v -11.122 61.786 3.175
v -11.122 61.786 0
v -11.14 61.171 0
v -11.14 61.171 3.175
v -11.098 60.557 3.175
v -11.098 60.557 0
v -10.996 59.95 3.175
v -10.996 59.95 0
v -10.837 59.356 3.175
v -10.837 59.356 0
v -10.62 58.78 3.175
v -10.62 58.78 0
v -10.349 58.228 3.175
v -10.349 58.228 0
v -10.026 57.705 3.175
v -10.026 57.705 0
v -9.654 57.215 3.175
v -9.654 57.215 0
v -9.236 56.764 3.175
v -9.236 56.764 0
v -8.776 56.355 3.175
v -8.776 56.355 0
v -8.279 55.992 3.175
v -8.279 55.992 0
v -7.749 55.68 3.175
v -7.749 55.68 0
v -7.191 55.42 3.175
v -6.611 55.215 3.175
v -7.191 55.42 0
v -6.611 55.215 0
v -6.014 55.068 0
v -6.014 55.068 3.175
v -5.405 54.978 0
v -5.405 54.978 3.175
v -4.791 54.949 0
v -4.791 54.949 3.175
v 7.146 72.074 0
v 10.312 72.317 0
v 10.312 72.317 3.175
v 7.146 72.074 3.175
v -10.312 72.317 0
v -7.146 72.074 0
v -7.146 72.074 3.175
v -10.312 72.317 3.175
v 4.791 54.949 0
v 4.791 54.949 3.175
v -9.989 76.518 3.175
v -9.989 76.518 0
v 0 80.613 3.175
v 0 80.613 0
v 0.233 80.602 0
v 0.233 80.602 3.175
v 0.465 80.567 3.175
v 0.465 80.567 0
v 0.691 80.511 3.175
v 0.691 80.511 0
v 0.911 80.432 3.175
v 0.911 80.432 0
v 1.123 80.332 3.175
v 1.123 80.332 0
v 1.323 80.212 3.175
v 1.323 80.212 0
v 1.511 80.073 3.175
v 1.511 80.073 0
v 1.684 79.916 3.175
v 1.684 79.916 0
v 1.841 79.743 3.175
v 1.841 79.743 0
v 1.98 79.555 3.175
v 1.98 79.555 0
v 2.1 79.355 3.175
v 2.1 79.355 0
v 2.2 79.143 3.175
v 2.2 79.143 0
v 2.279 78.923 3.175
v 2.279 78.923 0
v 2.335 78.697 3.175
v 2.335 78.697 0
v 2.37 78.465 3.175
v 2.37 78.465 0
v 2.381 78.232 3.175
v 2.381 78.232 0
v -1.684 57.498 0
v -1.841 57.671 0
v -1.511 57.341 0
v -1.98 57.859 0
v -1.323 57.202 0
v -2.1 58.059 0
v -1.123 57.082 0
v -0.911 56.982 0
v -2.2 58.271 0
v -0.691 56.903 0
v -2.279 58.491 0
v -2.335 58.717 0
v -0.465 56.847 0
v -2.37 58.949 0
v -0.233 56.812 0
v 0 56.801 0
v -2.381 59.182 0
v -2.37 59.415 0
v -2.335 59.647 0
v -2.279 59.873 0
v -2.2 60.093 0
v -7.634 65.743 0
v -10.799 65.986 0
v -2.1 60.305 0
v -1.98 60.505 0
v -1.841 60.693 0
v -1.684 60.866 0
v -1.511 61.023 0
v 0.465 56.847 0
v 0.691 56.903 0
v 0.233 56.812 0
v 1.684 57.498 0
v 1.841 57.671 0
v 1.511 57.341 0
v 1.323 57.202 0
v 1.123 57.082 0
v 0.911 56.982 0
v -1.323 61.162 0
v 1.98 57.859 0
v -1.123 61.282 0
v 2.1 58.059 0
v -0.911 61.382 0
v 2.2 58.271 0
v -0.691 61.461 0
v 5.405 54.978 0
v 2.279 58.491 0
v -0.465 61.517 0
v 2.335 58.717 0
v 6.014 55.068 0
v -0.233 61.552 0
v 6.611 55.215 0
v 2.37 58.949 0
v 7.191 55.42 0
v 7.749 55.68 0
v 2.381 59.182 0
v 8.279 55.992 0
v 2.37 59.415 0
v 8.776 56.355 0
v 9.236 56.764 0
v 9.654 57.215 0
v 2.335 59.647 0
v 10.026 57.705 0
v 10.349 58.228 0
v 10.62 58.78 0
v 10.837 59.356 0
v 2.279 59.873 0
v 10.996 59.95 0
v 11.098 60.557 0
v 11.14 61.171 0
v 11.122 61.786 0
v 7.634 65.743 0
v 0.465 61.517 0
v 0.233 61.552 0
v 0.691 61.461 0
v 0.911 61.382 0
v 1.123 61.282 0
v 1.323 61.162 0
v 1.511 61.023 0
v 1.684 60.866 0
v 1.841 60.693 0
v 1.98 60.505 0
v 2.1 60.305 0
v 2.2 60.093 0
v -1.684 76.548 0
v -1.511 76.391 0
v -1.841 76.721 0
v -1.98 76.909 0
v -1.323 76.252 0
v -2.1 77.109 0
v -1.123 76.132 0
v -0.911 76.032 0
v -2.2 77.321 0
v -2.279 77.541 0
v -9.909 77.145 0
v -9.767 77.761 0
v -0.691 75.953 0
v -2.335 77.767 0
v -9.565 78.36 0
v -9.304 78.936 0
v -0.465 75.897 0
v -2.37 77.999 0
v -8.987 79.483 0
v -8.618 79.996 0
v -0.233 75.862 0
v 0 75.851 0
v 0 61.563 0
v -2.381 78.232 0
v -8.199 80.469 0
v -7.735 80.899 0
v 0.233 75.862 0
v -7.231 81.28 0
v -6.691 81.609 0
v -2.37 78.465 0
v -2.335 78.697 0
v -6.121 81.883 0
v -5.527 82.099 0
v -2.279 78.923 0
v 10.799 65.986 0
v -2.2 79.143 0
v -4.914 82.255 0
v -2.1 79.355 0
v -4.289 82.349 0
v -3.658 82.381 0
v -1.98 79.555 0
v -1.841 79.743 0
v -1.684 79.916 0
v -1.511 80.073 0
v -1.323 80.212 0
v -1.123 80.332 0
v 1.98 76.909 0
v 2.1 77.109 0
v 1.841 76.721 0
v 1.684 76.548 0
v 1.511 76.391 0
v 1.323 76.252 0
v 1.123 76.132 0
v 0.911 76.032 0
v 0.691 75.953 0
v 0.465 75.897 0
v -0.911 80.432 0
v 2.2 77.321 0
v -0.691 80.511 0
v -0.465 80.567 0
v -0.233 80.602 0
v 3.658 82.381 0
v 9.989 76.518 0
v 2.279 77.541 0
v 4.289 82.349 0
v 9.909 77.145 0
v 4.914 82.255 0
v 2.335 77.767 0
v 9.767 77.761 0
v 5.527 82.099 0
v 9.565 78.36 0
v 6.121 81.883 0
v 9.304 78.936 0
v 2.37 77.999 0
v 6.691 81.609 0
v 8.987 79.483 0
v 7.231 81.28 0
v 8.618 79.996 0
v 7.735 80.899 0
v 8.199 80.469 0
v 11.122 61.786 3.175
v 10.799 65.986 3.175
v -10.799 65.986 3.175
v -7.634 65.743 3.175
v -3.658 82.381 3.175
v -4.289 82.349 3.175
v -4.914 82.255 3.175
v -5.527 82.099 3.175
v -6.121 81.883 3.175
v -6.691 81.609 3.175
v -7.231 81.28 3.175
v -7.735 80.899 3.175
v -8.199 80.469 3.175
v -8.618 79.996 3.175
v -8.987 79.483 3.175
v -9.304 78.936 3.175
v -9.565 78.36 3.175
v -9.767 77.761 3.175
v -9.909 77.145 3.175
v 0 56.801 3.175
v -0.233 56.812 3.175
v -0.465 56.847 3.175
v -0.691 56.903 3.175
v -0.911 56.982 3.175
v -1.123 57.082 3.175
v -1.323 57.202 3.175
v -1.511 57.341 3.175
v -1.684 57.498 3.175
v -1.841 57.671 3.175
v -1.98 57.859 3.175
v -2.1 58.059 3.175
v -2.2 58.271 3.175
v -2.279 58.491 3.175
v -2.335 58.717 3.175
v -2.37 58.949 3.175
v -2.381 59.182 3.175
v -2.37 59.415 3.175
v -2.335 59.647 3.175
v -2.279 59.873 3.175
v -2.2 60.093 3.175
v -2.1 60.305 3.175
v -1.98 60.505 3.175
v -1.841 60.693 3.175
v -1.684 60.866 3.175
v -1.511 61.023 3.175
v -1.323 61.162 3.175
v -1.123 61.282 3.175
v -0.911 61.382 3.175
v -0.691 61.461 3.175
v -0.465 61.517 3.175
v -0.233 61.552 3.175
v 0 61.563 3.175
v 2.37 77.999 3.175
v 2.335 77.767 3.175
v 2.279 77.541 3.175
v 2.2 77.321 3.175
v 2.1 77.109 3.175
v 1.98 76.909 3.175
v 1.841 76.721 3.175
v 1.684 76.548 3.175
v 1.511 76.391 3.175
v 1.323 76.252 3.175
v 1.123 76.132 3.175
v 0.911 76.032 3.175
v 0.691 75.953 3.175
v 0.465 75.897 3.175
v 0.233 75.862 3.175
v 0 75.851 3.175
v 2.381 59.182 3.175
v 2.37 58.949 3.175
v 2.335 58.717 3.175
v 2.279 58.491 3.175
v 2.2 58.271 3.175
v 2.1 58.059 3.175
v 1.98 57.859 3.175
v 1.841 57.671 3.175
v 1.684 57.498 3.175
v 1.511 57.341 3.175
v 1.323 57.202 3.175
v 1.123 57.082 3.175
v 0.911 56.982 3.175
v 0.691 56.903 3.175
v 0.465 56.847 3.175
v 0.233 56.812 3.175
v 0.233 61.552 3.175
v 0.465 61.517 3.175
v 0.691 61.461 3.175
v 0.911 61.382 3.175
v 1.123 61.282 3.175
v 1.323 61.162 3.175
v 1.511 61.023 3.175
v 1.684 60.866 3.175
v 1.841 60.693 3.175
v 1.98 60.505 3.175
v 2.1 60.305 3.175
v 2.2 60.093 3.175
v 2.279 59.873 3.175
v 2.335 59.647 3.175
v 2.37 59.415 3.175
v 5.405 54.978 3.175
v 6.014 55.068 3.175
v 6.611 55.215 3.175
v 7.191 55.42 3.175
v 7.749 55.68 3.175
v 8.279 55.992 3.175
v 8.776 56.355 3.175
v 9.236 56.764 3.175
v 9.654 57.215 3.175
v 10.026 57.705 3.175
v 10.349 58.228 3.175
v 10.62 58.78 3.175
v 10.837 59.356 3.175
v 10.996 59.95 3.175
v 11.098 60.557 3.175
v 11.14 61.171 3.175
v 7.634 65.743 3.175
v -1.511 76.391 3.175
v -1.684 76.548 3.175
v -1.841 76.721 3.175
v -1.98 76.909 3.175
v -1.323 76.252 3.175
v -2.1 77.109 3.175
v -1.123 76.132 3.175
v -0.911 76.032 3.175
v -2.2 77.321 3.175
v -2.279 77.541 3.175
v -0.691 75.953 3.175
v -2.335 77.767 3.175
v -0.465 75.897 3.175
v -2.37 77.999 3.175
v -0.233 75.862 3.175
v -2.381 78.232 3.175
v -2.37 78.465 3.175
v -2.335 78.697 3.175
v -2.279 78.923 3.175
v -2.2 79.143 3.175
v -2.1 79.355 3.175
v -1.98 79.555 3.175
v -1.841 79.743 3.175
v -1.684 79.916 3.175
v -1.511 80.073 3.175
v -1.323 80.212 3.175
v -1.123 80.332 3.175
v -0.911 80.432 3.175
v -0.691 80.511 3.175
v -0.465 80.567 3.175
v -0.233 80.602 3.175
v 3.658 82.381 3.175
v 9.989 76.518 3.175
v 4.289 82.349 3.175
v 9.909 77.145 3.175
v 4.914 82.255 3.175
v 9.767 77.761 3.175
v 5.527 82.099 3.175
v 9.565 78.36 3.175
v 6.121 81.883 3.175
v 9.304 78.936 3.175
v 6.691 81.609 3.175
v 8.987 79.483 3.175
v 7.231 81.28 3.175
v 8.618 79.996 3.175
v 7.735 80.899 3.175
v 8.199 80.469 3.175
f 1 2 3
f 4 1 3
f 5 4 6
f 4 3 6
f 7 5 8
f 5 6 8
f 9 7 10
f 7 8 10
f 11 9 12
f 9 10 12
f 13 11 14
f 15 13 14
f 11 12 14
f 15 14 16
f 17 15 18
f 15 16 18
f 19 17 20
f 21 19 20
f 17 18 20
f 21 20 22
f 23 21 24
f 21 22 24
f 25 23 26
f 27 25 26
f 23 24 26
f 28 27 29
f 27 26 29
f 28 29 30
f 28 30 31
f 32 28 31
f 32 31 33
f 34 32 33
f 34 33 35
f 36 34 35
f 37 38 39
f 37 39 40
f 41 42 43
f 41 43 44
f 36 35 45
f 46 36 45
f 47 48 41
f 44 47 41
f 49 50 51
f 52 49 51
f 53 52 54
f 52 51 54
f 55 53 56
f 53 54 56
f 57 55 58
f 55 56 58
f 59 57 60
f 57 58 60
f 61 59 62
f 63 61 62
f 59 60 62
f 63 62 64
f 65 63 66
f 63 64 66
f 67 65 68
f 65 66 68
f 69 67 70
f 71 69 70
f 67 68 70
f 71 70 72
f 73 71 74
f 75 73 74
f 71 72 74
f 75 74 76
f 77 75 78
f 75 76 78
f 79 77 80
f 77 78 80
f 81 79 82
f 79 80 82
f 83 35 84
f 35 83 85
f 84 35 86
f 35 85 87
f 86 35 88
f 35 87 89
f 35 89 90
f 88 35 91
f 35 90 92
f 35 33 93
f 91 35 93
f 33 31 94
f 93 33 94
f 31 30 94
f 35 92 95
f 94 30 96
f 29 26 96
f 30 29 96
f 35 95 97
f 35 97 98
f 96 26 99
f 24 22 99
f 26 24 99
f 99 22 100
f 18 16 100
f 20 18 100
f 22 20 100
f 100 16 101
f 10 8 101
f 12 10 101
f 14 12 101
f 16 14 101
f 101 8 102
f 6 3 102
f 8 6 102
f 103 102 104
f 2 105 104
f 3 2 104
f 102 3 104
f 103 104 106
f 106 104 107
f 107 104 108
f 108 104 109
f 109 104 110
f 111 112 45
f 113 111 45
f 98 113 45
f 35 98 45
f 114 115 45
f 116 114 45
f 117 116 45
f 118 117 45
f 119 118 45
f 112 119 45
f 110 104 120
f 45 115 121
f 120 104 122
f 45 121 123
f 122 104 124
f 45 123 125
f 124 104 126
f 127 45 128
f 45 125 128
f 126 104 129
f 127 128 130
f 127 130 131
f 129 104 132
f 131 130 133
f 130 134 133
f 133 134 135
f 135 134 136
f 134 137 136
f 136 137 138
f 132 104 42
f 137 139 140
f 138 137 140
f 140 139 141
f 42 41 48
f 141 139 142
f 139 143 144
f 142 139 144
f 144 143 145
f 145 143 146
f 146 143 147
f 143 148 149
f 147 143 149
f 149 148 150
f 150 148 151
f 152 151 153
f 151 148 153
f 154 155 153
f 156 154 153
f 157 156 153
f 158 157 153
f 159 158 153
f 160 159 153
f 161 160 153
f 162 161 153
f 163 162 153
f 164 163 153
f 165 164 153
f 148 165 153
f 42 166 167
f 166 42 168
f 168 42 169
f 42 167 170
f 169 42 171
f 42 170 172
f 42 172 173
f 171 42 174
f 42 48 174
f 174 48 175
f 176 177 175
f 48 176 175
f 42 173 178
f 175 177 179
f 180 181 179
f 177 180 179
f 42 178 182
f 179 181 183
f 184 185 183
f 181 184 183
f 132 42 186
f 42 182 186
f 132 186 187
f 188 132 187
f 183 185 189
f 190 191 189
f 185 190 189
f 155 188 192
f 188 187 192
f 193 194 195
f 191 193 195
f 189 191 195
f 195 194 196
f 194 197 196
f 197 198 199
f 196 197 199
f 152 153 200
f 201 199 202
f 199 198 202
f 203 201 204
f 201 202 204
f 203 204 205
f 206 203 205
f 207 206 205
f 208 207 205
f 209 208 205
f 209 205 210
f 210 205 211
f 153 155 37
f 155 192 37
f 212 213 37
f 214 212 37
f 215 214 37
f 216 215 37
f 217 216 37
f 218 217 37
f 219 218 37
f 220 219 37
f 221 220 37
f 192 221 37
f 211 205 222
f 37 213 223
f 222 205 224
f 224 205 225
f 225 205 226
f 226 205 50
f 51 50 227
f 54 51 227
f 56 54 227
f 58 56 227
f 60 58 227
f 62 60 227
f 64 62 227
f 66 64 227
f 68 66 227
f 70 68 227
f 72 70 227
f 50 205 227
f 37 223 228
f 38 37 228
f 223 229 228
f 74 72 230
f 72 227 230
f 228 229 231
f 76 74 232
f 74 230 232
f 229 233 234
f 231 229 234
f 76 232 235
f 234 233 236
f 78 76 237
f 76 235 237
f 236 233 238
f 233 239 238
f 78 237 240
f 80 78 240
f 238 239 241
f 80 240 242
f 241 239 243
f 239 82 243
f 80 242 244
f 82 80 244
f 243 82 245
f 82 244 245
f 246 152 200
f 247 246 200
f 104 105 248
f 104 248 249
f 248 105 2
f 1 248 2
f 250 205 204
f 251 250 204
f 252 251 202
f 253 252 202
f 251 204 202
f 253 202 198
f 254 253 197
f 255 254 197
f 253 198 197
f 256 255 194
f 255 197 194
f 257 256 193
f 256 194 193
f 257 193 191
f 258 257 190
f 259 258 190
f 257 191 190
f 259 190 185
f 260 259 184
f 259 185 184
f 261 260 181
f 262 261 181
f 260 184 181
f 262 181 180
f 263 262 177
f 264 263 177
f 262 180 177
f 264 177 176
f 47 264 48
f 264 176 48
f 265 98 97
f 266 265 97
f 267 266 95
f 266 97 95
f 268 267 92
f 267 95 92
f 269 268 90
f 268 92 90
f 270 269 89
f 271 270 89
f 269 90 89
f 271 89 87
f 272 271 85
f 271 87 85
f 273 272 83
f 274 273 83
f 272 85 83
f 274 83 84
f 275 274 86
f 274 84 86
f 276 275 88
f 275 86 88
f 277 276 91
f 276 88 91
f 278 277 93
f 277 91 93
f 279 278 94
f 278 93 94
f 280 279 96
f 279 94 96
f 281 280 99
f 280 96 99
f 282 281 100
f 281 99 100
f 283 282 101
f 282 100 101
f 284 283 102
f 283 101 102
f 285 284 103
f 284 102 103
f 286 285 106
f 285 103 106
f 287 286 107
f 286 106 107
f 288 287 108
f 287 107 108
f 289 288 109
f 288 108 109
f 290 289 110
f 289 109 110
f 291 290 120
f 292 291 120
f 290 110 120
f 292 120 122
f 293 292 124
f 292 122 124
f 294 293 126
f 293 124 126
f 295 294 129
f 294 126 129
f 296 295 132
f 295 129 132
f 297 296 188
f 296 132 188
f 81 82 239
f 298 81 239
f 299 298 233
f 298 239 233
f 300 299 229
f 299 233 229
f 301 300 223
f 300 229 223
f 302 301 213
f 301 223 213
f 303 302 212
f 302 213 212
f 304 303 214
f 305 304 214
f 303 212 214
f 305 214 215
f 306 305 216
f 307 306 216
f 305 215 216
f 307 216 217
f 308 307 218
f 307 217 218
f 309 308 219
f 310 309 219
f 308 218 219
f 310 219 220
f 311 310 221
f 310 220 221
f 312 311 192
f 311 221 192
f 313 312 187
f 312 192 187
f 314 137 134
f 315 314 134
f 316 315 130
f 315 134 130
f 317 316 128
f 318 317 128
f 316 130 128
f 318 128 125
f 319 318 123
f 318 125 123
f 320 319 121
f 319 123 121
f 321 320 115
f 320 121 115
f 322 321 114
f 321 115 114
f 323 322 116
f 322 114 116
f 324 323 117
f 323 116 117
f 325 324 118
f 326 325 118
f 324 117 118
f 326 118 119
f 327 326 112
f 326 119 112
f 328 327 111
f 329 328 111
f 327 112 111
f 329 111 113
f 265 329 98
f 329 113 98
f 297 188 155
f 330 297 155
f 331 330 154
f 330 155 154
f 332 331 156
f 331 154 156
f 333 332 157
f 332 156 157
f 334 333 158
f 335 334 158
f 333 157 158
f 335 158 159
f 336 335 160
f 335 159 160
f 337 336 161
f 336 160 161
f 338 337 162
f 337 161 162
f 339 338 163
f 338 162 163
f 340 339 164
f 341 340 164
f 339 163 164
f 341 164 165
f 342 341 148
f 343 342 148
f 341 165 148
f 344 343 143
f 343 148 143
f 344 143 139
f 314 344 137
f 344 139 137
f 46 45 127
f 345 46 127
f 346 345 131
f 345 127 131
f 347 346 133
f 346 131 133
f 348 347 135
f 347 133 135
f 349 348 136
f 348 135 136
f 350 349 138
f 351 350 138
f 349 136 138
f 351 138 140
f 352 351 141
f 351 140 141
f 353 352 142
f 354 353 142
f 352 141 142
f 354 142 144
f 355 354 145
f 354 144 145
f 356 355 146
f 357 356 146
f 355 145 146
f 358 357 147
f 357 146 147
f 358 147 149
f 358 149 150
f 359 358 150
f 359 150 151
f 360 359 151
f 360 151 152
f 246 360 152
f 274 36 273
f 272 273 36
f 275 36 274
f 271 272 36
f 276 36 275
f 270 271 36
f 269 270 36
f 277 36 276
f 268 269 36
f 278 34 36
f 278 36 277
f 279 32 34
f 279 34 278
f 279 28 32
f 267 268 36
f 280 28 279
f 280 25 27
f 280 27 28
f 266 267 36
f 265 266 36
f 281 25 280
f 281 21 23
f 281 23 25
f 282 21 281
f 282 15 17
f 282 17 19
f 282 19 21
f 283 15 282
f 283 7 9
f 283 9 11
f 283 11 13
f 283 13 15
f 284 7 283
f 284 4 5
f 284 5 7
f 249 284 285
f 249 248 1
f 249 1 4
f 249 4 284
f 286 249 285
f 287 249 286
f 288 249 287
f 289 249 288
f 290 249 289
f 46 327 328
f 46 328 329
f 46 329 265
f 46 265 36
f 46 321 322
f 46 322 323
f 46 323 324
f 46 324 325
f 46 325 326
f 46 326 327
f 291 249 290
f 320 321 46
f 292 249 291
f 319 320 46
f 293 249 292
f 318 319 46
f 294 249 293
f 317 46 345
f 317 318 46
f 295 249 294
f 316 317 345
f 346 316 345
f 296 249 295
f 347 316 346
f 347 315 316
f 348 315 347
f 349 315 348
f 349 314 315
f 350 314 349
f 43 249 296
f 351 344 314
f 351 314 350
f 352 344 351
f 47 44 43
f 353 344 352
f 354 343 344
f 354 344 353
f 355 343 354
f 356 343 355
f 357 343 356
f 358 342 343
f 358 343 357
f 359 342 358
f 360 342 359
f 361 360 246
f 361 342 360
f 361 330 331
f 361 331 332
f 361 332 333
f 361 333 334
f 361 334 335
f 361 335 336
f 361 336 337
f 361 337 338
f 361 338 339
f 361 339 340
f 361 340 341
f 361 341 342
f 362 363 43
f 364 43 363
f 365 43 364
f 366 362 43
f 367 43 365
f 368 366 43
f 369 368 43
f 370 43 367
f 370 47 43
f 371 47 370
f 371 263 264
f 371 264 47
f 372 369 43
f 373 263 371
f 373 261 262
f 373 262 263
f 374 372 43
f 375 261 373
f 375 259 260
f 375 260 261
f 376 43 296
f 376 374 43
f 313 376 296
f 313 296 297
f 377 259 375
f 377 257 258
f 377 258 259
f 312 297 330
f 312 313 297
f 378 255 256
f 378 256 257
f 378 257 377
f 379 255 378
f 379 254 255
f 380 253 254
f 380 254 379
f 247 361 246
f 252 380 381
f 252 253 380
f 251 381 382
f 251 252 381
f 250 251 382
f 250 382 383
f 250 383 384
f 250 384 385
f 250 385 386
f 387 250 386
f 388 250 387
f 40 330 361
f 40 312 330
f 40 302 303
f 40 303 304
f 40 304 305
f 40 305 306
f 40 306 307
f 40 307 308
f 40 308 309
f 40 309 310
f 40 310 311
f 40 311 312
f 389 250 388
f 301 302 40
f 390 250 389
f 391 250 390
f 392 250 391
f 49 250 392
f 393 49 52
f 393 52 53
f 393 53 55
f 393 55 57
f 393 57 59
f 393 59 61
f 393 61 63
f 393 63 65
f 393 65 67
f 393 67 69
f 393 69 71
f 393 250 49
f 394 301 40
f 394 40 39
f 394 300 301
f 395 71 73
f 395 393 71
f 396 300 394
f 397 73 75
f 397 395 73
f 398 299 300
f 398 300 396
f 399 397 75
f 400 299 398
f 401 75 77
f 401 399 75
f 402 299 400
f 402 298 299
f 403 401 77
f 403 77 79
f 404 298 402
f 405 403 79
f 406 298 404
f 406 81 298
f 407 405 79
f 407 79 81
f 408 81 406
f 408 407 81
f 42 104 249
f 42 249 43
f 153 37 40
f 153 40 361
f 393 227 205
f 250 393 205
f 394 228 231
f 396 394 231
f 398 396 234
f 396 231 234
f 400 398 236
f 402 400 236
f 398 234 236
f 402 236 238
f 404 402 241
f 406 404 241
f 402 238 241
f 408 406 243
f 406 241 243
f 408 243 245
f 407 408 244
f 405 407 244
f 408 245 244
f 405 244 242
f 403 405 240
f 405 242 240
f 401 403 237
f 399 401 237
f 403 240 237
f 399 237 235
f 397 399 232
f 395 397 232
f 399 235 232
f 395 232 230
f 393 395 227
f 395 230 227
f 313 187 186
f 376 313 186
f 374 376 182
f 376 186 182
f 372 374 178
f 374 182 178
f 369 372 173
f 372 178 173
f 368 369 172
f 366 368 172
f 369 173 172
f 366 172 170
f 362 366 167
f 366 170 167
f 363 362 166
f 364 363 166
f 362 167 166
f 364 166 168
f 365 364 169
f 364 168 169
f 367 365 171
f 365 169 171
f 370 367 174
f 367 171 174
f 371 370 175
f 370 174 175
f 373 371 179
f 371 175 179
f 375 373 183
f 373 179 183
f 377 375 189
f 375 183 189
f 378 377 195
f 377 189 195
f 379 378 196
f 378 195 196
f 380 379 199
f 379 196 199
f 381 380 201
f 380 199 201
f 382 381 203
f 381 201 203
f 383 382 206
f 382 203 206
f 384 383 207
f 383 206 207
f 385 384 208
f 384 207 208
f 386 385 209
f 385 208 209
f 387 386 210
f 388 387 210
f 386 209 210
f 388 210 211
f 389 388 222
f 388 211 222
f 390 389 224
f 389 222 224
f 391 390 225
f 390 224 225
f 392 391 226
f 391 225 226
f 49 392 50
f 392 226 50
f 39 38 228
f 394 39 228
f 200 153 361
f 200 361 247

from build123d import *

# Parameters (mm, degrees)
BOSS_EXTRUDE1_DEPTH = 3.175
CAVITY1_DEPTH       = 3.175


# Read off the part's stored shape, not the designer's step: Cavity1
with BuildPart() as part:
    # Sketch1 → Boss-Extrude1 (new body)
    with BuildSketch(Plane.XY):
        with BuildLine():
            Line((0, 80.613250085), (0, 82.380666667))
            Line((0, 82.380666667), (-3.657727907, 82.380666667))
            ThreePointArc((-3.657727907, 82.380666667), (-7.972232828, 80.689802562), (-9.98902389, 76.517689435))
            Line((-9.98902389, 76.517689435), (-11.122254659, 61.785689435))
            ThreePointArc((-11.122254659, 61.785689435), (-9.450094571, 56.984161746), (-4.790958676, 54.948666667))
            Line((-4.790958676, 54.948666667), (0, 54.948666667))
            Line((0, 54.948666667), (0, 56.800750085))
            ThreePointArc((0, 56.800750085), (-2.38125, 59.182000085), (0, 61.563250085))
            Line((0, 61.563250085), (0, 75.850750085))
            ThreePointArc((0, 75.850750085), (-2.38125, 78.232000085), (0, 80.613250085))
        make_face()
        with BuildLine():
            Line((11.122254659, 61.785689435), (9.98902389, 76.517689435))
            ThreePointArc((9.98902389, 76.517689435), (7.972232828, 80.689802562), (3.657727907, 82.380666667))
            Line((3.657727907, 82.380666667), (0, 82.380666667))
            Line((0, 82.380666667), (0, 80.613250085))
            ThreePointArc((0, 80.613250085), (1.683798023, 79.915798107), (2.38125, 78.232000085))
            ThreePointArc((2.38125, 78.232000085), (1.683798023, 76.548202062), (0, 75.850750085))
            Line((0, 75.850750085), (0, 61.563250085))
            ThreePointArc((0, 61.563250085), (1.683798023, 60.865798107), (2.38125, 59.182000085))
            ThreePointArc((2.38125, 59.182000085), (1.683798023, 57.498202062), (0, 56.800750085))
            Line((0, 56.800750085), (0, 54.948666667))
            Line((0, 54.948666667), (4.790958676, 54.948666667))
            ThreePointArc((4.790958676, 54.948666667), (9.450094571, 56.984161746), (11.122254659, 61.785689435))
        make_face()
    extrude(amount=BOSS_EXTRUDE1_DEPTH)

    # Cavity1 outline → Cavity1 (cut)
    with BuildSketch(Plane.XY):
        Polygon((-7.633502667, 65.742530059), (-7.146479899, 72.073826042), (-10.31212789, 72.317337426), (-10.799150658, 65.986041443), align=None)
        Polygon((10.31212789, 72.317337426), (7.146479899, 72.073826042), (7.633502667, 65.742530059), (10.799150658, 65.986041443), align=None)
    extrude(amount=CAVITY1_DEPTH, mode=Mode.SUBTRACT)


solid = part.part
